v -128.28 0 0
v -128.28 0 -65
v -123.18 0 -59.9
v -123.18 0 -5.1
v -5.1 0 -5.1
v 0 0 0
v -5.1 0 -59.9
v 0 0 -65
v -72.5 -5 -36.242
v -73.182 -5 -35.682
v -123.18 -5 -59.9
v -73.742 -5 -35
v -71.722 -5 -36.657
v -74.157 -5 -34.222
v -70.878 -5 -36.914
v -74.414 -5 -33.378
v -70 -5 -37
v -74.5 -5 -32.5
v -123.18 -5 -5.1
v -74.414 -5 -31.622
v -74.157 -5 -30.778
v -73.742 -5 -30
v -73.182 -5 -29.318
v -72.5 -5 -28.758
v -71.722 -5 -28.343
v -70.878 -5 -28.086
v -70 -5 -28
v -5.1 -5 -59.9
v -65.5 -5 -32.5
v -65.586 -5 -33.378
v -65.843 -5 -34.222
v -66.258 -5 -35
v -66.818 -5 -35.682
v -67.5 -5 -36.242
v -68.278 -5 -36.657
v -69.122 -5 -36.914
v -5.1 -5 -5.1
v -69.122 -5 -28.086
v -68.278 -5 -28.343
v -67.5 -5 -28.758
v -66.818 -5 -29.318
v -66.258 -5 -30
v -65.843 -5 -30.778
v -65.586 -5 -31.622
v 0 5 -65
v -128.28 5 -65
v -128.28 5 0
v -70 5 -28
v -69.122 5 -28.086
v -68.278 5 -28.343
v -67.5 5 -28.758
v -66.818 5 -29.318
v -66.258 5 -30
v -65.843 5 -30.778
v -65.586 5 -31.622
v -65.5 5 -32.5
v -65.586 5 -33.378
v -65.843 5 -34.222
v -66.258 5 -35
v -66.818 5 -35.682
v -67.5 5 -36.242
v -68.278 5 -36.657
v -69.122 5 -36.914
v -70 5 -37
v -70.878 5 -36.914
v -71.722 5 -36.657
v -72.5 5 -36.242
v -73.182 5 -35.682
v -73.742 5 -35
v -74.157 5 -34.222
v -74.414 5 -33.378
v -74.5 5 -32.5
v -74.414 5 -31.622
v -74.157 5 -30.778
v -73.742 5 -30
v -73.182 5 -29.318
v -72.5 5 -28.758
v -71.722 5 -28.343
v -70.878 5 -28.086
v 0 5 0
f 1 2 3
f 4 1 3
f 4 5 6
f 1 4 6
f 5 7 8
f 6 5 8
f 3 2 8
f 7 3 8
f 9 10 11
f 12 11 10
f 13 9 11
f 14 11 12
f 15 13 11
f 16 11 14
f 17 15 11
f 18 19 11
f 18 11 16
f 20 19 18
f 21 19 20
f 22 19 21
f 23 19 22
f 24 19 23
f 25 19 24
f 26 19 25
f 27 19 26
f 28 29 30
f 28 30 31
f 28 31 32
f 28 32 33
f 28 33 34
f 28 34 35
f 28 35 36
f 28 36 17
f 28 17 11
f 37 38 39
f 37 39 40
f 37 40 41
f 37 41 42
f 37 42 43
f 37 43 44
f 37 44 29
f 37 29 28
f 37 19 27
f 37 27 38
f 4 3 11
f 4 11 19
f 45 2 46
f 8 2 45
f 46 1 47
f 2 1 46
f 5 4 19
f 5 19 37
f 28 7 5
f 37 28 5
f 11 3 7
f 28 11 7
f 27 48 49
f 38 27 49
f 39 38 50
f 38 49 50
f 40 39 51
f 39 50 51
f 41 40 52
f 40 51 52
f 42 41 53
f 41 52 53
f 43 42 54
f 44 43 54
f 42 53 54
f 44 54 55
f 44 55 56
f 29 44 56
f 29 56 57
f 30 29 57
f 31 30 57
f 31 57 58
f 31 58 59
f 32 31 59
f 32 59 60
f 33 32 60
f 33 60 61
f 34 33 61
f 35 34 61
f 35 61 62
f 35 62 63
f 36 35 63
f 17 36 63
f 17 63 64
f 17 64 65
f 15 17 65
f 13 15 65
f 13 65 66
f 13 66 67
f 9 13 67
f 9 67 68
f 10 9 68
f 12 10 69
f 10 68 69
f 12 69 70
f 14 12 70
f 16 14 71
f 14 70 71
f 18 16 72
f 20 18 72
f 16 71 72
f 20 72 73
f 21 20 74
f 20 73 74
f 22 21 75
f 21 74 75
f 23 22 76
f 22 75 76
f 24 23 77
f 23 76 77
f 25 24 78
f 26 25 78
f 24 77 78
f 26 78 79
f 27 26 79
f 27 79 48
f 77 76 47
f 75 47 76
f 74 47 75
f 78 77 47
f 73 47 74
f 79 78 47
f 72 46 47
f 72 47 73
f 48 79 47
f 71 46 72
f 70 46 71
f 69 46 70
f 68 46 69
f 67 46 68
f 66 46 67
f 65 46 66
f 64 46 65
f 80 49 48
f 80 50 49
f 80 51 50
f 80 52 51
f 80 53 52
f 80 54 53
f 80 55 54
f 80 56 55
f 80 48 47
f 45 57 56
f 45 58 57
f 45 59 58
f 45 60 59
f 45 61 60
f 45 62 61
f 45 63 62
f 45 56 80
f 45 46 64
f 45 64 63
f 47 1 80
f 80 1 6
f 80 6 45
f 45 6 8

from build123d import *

# Parameters (mm, degrees)
SKETCH1_W           = 128.28
SKETCH1_H           = 65
BOSS_EXTRUDE1_DEPTH = 5
SKETCH3_W           = 118.08
SKETCH3_H           = 54.8
BOSS_EXTRUDE2_DEPTH = 5
CUT_EXTRUDE1_REACH  = 146.155
SKETCH4_R           = 4.5


with BuildPart() as part:
    # Sketch1 → Boss-Extrude1 (new body)
    with BuildSketch(Plane(origin=(0, 0, 0), x_dir=(1, 0, 0), z_dir=(0, 1, 0))):
        with Locations((-64.14, 32.5)):
            Rectangle(SKETCH1_W, SKETCH1_H)
    extrude(amount=BOSS_EXTRUDE1_DEPTH)

    # Sketch3 → Boss-Extrude2 (add)
    with BuildSketch(Plane.XZ):
        with Locations((-64.14, -32.5)):
            Rectangle(SKETCH3_W, SKETCH3_H)
    extrude(amount=BOSS_EXTRUDE2_DEPTH)

    # Sketch4 → Cut-Extrude1 (cut, up to next)
    with BuildSketch(Plane(origin=(0, 5, 0), x_dir=(1, 0, 0), z_dir=(0, 1, 0)), mode=Mode.PRIVATE) as cut_extrude1_sk1:
        with Locations(Location((-70, 32.5, 0), (0, 0, 270))):
            Circle(SKETCH4_R)
    cut_extrude1_tool1 = extrude(cut_extrude1_sk1.sketch, amount=-CUT_EXTRUDE1_REACH, mode=Mode.PRIVATE) & part.part
    add(cut_extrude1_tool1.solids().sort_by_distance((-70, 5, -32.5))[0], mode=Mode.SUBTRACT)


solid = part.part
